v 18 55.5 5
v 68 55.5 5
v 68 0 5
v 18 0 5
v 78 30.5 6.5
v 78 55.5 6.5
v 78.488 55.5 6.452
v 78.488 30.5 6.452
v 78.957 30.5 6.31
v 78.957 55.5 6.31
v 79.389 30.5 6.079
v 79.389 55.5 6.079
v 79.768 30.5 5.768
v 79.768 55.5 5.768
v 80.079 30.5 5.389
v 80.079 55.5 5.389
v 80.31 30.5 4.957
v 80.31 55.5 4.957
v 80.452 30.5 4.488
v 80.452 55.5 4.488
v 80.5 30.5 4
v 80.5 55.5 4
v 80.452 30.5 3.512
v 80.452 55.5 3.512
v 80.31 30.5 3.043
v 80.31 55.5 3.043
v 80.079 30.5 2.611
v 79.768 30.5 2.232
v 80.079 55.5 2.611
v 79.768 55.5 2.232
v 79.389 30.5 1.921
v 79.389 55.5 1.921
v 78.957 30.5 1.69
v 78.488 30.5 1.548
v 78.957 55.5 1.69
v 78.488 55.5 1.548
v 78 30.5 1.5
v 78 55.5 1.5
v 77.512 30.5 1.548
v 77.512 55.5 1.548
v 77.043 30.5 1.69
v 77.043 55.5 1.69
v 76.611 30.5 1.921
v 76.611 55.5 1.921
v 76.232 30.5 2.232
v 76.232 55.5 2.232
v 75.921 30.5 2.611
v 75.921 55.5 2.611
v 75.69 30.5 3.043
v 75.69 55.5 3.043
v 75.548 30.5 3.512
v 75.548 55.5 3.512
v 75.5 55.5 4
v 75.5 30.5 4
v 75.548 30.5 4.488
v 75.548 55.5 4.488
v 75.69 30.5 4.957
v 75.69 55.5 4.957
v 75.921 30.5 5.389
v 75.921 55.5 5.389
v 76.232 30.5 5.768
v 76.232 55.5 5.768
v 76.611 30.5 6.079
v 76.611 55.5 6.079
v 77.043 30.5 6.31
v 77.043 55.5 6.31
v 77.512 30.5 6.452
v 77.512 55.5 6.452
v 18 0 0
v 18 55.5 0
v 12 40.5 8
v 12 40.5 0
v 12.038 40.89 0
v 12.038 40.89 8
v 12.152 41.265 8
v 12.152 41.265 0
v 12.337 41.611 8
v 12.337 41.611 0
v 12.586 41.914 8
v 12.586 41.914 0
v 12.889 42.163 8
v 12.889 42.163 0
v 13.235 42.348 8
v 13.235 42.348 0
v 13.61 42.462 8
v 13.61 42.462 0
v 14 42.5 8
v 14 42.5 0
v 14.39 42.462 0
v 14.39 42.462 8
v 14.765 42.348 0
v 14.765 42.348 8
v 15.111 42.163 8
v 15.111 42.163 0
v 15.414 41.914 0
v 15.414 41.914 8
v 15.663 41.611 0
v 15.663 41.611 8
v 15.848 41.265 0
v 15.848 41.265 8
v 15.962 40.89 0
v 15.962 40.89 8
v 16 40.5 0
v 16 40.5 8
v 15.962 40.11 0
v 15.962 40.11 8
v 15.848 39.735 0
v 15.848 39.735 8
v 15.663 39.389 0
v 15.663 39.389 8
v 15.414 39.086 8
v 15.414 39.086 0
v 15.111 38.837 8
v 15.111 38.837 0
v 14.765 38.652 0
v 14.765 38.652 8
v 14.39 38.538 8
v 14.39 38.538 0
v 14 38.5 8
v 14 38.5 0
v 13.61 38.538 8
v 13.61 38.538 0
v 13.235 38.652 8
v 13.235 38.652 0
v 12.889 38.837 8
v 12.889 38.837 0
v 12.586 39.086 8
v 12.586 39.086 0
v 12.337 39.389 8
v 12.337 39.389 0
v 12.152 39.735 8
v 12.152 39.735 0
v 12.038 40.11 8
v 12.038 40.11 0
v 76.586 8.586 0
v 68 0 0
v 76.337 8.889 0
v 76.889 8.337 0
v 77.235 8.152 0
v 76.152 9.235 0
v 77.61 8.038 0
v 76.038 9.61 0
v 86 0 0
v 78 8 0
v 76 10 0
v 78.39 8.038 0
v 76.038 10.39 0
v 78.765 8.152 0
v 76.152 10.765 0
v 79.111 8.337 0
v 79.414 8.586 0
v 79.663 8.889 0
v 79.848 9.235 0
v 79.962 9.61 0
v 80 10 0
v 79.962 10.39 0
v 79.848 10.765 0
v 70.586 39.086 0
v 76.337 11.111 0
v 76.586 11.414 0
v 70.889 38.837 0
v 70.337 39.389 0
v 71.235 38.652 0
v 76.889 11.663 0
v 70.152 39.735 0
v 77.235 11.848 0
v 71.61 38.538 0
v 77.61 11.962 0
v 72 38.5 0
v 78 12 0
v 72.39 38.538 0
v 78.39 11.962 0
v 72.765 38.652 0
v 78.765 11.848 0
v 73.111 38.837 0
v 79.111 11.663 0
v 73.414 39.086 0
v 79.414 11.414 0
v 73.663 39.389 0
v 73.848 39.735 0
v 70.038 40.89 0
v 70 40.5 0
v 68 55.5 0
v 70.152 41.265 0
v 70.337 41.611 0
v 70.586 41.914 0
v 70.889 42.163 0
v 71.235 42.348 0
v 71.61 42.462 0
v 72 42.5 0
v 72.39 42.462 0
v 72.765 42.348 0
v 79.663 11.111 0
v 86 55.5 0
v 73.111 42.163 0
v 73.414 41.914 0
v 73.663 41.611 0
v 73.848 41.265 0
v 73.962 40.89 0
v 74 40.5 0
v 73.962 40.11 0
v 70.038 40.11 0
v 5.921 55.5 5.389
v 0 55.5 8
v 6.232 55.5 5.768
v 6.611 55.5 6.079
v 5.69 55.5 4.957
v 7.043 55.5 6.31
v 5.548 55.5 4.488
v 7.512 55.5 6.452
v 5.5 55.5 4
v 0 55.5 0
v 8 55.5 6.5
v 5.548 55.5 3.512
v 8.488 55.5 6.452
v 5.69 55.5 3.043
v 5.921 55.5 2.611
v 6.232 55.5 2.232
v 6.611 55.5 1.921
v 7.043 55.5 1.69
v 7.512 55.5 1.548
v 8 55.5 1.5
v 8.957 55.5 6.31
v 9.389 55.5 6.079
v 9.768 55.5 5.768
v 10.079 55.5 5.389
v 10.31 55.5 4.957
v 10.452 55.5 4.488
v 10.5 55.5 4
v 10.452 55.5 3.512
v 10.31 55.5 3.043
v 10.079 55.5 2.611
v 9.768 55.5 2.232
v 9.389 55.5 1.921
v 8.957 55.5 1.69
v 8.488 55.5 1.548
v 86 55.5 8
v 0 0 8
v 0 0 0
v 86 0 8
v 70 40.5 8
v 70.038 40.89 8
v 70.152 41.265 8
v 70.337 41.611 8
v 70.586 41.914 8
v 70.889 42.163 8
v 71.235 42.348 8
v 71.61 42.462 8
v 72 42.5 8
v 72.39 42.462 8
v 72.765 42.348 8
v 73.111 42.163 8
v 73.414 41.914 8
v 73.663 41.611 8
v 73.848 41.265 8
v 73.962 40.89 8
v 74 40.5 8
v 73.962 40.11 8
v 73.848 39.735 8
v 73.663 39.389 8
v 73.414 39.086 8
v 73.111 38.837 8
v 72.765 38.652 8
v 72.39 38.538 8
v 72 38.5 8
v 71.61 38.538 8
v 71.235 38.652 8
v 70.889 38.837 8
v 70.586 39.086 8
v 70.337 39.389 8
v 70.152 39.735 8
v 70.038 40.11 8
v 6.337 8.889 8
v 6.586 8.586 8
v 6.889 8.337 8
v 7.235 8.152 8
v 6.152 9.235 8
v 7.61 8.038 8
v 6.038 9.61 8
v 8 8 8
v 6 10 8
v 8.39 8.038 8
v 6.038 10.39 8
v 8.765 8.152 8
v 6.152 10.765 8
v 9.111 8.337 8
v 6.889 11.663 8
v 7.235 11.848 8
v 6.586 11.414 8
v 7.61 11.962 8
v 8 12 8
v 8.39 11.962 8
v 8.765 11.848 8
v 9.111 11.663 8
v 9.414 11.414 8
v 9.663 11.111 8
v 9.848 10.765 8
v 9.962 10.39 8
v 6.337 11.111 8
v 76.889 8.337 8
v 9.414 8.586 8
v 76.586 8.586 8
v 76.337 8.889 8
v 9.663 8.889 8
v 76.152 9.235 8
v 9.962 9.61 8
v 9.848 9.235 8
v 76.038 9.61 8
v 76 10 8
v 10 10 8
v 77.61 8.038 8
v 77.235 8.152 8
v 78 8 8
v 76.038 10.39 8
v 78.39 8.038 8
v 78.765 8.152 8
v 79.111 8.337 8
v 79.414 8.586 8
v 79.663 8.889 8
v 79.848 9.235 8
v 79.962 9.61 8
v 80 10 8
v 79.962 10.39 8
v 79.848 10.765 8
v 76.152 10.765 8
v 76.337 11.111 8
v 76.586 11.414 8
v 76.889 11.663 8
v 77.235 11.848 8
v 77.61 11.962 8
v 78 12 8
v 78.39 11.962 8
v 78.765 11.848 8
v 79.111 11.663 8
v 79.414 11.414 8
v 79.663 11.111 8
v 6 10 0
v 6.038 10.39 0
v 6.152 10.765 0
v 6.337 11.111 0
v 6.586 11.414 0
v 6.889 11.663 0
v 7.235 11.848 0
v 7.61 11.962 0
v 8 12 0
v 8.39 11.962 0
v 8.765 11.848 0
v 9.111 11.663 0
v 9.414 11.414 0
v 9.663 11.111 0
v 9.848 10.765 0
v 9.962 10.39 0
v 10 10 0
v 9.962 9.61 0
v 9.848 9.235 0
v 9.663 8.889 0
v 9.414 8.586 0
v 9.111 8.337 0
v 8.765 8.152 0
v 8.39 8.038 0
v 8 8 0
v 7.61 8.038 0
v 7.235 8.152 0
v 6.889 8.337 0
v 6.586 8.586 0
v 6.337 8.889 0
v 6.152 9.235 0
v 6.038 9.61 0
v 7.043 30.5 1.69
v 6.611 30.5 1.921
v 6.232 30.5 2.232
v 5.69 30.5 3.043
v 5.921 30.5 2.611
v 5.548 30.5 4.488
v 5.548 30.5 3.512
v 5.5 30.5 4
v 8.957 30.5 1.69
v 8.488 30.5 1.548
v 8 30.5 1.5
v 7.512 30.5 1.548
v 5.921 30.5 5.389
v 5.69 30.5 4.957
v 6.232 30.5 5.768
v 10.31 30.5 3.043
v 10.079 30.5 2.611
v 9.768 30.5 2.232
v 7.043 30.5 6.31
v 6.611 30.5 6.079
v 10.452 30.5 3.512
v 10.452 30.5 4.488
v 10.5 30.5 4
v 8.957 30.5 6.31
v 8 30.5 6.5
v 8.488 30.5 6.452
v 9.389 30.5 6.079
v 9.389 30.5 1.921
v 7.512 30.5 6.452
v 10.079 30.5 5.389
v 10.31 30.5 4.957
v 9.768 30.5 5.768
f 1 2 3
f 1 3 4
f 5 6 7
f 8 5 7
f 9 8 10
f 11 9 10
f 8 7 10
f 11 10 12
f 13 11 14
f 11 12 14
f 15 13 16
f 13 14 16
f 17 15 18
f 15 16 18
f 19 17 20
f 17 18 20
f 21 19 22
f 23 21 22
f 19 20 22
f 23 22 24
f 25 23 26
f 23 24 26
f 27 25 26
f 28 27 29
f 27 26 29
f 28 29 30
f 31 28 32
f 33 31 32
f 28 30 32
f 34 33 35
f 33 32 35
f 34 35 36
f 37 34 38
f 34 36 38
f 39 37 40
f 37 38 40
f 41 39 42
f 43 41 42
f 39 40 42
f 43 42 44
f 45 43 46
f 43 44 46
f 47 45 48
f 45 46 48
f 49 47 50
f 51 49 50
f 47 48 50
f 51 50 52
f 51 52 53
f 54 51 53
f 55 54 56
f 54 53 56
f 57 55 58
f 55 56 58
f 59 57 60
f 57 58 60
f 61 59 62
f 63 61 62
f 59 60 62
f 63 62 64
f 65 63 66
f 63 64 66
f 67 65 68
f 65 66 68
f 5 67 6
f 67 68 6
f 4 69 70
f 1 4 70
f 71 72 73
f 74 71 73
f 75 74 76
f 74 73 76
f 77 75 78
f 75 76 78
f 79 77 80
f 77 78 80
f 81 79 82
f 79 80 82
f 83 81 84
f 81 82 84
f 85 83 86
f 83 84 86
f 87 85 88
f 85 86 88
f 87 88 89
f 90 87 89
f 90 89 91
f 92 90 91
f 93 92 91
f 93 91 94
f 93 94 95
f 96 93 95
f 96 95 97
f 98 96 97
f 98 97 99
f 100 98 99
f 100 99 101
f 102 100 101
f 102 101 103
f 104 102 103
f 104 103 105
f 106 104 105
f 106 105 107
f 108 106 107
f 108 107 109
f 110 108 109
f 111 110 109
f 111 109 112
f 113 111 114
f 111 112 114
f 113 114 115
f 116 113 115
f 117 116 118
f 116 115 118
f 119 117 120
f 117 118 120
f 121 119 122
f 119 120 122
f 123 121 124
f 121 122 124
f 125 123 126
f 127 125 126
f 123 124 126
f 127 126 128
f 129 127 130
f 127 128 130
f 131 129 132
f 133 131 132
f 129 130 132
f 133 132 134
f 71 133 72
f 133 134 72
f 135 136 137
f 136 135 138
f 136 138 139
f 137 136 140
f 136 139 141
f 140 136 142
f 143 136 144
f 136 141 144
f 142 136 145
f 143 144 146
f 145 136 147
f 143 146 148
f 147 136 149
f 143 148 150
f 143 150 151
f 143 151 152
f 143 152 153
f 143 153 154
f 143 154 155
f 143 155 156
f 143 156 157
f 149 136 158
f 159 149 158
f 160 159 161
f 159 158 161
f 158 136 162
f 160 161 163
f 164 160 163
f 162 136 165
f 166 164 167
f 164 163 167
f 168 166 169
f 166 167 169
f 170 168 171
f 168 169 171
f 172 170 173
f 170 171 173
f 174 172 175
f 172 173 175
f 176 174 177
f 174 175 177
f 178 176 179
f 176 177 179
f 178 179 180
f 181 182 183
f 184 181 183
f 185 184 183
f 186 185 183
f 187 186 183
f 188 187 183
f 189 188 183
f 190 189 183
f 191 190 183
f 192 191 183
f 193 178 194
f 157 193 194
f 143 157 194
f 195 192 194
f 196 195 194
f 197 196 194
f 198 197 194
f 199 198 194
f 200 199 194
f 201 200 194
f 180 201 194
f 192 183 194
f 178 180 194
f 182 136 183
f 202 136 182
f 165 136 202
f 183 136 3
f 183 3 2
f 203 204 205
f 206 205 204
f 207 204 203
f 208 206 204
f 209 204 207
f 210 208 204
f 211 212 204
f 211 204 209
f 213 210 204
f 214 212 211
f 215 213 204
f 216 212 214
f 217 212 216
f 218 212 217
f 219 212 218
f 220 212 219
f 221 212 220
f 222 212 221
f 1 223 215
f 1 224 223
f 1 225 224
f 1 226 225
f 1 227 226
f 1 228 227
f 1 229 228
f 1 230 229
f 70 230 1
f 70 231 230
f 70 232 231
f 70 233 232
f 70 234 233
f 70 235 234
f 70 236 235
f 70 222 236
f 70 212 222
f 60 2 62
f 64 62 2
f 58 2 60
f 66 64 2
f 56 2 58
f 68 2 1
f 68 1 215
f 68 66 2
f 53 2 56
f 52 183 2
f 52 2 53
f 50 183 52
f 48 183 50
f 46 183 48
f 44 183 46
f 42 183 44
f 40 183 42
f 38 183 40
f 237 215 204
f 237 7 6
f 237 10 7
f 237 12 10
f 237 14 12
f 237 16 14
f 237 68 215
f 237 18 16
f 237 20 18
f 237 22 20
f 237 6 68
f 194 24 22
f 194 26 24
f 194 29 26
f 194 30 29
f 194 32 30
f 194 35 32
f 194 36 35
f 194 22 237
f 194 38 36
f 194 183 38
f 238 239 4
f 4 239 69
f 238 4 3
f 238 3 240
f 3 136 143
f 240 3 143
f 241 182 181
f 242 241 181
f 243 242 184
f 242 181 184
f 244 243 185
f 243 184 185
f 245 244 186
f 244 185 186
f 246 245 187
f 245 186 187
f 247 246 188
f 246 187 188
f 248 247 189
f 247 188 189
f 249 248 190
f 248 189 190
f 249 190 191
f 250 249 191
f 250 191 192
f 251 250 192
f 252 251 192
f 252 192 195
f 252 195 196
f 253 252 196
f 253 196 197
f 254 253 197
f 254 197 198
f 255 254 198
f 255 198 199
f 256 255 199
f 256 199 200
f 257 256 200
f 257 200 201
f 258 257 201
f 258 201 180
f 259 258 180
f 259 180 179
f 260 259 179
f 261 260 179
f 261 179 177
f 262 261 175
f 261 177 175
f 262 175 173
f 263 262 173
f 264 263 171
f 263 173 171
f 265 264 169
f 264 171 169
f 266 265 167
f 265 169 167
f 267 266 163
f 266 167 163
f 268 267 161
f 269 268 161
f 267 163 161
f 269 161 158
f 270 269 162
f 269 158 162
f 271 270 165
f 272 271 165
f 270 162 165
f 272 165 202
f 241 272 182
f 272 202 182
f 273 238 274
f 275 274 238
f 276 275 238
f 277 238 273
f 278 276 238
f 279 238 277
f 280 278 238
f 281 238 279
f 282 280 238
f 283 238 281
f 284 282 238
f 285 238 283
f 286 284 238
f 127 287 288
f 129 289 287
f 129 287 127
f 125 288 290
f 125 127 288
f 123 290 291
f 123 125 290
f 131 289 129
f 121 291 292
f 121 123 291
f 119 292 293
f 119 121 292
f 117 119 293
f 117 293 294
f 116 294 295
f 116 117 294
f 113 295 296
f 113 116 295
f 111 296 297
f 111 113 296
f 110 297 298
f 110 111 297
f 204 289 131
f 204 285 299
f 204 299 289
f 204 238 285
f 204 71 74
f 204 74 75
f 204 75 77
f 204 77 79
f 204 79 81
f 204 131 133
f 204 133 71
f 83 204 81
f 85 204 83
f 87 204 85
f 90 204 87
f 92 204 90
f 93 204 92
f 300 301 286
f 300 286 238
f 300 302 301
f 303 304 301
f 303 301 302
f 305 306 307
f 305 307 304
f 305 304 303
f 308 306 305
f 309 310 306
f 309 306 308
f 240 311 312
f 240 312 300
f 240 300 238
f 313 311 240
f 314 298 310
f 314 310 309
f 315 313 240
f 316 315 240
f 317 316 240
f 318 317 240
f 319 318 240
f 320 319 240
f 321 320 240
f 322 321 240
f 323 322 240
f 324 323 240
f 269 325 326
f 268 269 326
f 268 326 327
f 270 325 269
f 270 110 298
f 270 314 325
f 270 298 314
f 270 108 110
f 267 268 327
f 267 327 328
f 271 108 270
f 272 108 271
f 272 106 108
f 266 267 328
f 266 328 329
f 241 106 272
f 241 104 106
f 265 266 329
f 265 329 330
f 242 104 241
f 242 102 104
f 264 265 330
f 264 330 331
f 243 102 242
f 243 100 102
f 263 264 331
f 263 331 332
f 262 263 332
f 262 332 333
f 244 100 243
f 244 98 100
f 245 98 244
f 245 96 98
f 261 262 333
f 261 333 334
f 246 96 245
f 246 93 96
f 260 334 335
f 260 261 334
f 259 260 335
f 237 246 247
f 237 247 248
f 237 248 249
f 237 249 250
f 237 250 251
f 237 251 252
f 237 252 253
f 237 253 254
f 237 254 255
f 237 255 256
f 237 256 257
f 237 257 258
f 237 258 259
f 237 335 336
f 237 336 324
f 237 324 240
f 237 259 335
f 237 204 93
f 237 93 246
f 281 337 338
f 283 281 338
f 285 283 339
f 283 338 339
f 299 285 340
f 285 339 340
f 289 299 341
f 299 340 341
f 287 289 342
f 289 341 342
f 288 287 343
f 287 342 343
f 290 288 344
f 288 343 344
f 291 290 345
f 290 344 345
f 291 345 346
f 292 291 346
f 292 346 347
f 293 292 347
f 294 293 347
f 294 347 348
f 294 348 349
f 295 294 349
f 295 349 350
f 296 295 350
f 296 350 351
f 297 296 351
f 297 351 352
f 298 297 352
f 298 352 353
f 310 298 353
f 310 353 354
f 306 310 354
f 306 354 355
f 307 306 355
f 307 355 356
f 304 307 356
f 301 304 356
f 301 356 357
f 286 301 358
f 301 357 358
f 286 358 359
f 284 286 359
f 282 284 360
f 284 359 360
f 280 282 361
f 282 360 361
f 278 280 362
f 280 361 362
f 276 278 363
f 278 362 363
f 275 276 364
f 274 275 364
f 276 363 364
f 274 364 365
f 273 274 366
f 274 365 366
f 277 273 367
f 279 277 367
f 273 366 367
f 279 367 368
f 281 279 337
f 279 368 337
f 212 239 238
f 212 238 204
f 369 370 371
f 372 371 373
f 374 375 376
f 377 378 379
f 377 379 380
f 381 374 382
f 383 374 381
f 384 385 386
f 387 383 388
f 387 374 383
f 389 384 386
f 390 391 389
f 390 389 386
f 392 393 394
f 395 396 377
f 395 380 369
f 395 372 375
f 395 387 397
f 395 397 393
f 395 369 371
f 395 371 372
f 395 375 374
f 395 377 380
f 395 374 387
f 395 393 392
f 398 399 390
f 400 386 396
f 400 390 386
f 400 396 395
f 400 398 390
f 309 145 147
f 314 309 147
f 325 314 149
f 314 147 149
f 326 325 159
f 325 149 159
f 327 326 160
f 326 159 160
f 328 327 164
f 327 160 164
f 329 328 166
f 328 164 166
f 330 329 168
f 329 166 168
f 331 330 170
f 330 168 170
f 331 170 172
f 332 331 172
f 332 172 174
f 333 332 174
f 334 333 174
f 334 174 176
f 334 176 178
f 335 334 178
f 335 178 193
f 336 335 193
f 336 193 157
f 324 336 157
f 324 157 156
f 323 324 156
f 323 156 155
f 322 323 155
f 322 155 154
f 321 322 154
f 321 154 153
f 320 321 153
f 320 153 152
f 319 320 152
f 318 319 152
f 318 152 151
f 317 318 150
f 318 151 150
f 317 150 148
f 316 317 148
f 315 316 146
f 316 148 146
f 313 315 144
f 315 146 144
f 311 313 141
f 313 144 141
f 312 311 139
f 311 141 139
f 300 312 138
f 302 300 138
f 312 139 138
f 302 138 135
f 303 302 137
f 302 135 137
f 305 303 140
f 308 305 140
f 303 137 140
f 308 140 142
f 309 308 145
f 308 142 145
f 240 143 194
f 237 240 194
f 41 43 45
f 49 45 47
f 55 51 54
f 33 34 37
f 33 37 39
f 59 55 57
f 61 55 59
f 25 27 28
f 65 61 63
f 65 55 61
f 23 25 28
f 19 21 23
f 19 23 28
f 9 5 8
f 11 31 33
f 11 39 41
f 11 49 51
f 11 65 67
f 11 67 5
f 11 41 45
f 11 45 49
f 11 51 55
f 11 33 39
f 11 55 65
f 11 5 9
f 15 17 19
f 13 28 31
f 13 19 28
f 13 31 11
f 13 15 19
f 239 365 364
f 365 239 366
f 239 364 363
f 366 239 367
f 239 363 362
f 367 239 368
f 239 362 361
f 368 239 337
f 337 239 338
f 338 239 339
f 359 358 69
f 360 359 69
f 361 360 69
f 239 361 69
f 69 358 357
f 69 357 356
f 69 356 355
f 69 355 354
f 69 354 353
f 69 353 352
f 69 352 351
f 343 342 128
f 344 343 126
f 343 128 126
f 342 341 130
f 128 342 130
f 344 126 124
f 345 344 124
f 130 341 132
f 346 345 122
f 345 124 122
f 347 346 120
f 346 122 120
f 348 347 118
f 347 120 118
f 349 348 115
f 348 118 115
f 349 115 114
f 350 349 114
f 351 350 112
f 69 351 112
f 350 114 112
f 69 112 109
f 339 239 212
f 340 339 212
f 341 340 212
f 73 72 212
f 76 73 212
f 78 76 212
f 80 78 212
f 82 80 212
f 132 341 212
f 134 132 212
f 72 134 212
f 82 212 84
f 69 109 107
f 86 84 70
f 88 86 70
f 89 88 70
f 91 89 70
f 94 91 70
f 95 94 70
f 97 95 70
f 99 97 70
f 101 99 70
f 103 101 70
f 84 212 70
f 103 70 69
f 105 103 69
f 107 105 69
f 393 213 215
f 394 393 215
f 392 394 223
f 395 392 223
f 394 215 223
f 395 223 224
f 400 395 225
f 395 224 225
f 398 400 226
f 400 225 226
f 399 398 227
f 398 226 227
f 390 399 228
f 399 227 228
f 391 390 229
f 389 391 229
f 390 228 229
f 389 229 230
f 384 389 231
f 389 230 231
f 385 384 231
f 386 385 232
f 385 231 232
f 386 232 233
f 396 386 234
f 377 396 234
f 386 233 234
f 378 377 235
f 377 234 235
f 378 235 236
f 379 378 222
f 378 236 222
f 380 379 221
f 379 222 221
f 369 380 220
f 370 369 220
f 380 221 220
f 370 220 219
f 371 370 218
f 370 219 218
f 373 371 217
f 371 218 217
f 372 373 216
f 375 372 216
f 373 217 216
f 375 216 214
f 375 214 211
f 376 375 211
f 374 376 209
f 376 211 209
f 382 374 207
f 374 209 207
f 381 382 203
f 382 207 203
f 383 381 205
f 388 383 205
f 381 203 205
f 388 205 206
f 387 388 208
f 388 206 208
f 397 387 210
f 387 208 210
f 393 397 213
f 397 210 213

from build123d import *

# Parameters (mm, degrees)
SKETCH_1_W          = 86
SKETCH_1_H          = 55.5
EXTRUDE_1_DEPTH     = 8
SKETCH_2_R          = 2.5
CUT_EXTRUDE_1_DEPTH = 25
SKETCH_3_W          = 50
SKETCH_3_H          = 55.5
CUT_EXTRUDE_2_DEPTH = 5
SKETCH_4_R          = 2
CUT_EXTRUDE_3_DEPTH = 103.665719693


with BuildPart() as part:
    # 草图1 → 拉伸1 (new body)
    with BuildSketch(Plane.XY):
        with Locations((43, 27.75)):
            Rectangle(SKETCH_1_W, SKETCH_1_H)
    extrude(amount=EXTRUDE_1_DEPTH)

    # 草图2 → 切除-拉伸1 (cut)
    with BuildSketch(Plane(origin=(0, 55.5, 0), x_dir=(-1, 0, 0), z_dir=(0, 1, 0))):
        with Locations(Location((-78, 4, 0), (0, 0, 90))):
            Circle(SKETCH_2_R)
        with Locations(Location((-8, 4, 0), (0, 0, 90))):
            Circle(SKETCH_2_R)
    extrude(amount=-CUT_EXTRUDE_1_DEPTH, mode=Mode.SUBTRACT)

    # 草图3 → 切除-拉伸2 (cut)
    with BuildSketch(Plane(origin=(0, 0, 0), x_dir=(-1, 0, 0), z_dir=(0, 0, -1))):
        with Locations((-43, 27.75)):
            Rectangle(SKETCH_3_W, SKETCH_3_H)
    extrude(amount=-CUT_EXTRUDE_2_DEPTH, mode=Mode.SUBTRACT)

    # 草图4 → 切除-拉伸3 (cut, through all)
    with BuildSketch(Plane(origin=(0, 0, 0), x_dir=(-1, 0, 0), z_dir=(0, 0, -1))):
        with Locations((-72, 40.5)):
            Circle(SKETCH_4_R)
        with Locations((-78, 10)):
            Circle(SKETCH_4_R)
        with Locations((-14, 40.5)):
            Circle(SKETCH_4_R)
        with Locations((-8, 10)):
            Circle(SKETCH_4_R)
    extrude(amount=-CUT_EXTRUDE_3_DEPTH, mode=Mode.SUBTRACT)


solid = part.part
